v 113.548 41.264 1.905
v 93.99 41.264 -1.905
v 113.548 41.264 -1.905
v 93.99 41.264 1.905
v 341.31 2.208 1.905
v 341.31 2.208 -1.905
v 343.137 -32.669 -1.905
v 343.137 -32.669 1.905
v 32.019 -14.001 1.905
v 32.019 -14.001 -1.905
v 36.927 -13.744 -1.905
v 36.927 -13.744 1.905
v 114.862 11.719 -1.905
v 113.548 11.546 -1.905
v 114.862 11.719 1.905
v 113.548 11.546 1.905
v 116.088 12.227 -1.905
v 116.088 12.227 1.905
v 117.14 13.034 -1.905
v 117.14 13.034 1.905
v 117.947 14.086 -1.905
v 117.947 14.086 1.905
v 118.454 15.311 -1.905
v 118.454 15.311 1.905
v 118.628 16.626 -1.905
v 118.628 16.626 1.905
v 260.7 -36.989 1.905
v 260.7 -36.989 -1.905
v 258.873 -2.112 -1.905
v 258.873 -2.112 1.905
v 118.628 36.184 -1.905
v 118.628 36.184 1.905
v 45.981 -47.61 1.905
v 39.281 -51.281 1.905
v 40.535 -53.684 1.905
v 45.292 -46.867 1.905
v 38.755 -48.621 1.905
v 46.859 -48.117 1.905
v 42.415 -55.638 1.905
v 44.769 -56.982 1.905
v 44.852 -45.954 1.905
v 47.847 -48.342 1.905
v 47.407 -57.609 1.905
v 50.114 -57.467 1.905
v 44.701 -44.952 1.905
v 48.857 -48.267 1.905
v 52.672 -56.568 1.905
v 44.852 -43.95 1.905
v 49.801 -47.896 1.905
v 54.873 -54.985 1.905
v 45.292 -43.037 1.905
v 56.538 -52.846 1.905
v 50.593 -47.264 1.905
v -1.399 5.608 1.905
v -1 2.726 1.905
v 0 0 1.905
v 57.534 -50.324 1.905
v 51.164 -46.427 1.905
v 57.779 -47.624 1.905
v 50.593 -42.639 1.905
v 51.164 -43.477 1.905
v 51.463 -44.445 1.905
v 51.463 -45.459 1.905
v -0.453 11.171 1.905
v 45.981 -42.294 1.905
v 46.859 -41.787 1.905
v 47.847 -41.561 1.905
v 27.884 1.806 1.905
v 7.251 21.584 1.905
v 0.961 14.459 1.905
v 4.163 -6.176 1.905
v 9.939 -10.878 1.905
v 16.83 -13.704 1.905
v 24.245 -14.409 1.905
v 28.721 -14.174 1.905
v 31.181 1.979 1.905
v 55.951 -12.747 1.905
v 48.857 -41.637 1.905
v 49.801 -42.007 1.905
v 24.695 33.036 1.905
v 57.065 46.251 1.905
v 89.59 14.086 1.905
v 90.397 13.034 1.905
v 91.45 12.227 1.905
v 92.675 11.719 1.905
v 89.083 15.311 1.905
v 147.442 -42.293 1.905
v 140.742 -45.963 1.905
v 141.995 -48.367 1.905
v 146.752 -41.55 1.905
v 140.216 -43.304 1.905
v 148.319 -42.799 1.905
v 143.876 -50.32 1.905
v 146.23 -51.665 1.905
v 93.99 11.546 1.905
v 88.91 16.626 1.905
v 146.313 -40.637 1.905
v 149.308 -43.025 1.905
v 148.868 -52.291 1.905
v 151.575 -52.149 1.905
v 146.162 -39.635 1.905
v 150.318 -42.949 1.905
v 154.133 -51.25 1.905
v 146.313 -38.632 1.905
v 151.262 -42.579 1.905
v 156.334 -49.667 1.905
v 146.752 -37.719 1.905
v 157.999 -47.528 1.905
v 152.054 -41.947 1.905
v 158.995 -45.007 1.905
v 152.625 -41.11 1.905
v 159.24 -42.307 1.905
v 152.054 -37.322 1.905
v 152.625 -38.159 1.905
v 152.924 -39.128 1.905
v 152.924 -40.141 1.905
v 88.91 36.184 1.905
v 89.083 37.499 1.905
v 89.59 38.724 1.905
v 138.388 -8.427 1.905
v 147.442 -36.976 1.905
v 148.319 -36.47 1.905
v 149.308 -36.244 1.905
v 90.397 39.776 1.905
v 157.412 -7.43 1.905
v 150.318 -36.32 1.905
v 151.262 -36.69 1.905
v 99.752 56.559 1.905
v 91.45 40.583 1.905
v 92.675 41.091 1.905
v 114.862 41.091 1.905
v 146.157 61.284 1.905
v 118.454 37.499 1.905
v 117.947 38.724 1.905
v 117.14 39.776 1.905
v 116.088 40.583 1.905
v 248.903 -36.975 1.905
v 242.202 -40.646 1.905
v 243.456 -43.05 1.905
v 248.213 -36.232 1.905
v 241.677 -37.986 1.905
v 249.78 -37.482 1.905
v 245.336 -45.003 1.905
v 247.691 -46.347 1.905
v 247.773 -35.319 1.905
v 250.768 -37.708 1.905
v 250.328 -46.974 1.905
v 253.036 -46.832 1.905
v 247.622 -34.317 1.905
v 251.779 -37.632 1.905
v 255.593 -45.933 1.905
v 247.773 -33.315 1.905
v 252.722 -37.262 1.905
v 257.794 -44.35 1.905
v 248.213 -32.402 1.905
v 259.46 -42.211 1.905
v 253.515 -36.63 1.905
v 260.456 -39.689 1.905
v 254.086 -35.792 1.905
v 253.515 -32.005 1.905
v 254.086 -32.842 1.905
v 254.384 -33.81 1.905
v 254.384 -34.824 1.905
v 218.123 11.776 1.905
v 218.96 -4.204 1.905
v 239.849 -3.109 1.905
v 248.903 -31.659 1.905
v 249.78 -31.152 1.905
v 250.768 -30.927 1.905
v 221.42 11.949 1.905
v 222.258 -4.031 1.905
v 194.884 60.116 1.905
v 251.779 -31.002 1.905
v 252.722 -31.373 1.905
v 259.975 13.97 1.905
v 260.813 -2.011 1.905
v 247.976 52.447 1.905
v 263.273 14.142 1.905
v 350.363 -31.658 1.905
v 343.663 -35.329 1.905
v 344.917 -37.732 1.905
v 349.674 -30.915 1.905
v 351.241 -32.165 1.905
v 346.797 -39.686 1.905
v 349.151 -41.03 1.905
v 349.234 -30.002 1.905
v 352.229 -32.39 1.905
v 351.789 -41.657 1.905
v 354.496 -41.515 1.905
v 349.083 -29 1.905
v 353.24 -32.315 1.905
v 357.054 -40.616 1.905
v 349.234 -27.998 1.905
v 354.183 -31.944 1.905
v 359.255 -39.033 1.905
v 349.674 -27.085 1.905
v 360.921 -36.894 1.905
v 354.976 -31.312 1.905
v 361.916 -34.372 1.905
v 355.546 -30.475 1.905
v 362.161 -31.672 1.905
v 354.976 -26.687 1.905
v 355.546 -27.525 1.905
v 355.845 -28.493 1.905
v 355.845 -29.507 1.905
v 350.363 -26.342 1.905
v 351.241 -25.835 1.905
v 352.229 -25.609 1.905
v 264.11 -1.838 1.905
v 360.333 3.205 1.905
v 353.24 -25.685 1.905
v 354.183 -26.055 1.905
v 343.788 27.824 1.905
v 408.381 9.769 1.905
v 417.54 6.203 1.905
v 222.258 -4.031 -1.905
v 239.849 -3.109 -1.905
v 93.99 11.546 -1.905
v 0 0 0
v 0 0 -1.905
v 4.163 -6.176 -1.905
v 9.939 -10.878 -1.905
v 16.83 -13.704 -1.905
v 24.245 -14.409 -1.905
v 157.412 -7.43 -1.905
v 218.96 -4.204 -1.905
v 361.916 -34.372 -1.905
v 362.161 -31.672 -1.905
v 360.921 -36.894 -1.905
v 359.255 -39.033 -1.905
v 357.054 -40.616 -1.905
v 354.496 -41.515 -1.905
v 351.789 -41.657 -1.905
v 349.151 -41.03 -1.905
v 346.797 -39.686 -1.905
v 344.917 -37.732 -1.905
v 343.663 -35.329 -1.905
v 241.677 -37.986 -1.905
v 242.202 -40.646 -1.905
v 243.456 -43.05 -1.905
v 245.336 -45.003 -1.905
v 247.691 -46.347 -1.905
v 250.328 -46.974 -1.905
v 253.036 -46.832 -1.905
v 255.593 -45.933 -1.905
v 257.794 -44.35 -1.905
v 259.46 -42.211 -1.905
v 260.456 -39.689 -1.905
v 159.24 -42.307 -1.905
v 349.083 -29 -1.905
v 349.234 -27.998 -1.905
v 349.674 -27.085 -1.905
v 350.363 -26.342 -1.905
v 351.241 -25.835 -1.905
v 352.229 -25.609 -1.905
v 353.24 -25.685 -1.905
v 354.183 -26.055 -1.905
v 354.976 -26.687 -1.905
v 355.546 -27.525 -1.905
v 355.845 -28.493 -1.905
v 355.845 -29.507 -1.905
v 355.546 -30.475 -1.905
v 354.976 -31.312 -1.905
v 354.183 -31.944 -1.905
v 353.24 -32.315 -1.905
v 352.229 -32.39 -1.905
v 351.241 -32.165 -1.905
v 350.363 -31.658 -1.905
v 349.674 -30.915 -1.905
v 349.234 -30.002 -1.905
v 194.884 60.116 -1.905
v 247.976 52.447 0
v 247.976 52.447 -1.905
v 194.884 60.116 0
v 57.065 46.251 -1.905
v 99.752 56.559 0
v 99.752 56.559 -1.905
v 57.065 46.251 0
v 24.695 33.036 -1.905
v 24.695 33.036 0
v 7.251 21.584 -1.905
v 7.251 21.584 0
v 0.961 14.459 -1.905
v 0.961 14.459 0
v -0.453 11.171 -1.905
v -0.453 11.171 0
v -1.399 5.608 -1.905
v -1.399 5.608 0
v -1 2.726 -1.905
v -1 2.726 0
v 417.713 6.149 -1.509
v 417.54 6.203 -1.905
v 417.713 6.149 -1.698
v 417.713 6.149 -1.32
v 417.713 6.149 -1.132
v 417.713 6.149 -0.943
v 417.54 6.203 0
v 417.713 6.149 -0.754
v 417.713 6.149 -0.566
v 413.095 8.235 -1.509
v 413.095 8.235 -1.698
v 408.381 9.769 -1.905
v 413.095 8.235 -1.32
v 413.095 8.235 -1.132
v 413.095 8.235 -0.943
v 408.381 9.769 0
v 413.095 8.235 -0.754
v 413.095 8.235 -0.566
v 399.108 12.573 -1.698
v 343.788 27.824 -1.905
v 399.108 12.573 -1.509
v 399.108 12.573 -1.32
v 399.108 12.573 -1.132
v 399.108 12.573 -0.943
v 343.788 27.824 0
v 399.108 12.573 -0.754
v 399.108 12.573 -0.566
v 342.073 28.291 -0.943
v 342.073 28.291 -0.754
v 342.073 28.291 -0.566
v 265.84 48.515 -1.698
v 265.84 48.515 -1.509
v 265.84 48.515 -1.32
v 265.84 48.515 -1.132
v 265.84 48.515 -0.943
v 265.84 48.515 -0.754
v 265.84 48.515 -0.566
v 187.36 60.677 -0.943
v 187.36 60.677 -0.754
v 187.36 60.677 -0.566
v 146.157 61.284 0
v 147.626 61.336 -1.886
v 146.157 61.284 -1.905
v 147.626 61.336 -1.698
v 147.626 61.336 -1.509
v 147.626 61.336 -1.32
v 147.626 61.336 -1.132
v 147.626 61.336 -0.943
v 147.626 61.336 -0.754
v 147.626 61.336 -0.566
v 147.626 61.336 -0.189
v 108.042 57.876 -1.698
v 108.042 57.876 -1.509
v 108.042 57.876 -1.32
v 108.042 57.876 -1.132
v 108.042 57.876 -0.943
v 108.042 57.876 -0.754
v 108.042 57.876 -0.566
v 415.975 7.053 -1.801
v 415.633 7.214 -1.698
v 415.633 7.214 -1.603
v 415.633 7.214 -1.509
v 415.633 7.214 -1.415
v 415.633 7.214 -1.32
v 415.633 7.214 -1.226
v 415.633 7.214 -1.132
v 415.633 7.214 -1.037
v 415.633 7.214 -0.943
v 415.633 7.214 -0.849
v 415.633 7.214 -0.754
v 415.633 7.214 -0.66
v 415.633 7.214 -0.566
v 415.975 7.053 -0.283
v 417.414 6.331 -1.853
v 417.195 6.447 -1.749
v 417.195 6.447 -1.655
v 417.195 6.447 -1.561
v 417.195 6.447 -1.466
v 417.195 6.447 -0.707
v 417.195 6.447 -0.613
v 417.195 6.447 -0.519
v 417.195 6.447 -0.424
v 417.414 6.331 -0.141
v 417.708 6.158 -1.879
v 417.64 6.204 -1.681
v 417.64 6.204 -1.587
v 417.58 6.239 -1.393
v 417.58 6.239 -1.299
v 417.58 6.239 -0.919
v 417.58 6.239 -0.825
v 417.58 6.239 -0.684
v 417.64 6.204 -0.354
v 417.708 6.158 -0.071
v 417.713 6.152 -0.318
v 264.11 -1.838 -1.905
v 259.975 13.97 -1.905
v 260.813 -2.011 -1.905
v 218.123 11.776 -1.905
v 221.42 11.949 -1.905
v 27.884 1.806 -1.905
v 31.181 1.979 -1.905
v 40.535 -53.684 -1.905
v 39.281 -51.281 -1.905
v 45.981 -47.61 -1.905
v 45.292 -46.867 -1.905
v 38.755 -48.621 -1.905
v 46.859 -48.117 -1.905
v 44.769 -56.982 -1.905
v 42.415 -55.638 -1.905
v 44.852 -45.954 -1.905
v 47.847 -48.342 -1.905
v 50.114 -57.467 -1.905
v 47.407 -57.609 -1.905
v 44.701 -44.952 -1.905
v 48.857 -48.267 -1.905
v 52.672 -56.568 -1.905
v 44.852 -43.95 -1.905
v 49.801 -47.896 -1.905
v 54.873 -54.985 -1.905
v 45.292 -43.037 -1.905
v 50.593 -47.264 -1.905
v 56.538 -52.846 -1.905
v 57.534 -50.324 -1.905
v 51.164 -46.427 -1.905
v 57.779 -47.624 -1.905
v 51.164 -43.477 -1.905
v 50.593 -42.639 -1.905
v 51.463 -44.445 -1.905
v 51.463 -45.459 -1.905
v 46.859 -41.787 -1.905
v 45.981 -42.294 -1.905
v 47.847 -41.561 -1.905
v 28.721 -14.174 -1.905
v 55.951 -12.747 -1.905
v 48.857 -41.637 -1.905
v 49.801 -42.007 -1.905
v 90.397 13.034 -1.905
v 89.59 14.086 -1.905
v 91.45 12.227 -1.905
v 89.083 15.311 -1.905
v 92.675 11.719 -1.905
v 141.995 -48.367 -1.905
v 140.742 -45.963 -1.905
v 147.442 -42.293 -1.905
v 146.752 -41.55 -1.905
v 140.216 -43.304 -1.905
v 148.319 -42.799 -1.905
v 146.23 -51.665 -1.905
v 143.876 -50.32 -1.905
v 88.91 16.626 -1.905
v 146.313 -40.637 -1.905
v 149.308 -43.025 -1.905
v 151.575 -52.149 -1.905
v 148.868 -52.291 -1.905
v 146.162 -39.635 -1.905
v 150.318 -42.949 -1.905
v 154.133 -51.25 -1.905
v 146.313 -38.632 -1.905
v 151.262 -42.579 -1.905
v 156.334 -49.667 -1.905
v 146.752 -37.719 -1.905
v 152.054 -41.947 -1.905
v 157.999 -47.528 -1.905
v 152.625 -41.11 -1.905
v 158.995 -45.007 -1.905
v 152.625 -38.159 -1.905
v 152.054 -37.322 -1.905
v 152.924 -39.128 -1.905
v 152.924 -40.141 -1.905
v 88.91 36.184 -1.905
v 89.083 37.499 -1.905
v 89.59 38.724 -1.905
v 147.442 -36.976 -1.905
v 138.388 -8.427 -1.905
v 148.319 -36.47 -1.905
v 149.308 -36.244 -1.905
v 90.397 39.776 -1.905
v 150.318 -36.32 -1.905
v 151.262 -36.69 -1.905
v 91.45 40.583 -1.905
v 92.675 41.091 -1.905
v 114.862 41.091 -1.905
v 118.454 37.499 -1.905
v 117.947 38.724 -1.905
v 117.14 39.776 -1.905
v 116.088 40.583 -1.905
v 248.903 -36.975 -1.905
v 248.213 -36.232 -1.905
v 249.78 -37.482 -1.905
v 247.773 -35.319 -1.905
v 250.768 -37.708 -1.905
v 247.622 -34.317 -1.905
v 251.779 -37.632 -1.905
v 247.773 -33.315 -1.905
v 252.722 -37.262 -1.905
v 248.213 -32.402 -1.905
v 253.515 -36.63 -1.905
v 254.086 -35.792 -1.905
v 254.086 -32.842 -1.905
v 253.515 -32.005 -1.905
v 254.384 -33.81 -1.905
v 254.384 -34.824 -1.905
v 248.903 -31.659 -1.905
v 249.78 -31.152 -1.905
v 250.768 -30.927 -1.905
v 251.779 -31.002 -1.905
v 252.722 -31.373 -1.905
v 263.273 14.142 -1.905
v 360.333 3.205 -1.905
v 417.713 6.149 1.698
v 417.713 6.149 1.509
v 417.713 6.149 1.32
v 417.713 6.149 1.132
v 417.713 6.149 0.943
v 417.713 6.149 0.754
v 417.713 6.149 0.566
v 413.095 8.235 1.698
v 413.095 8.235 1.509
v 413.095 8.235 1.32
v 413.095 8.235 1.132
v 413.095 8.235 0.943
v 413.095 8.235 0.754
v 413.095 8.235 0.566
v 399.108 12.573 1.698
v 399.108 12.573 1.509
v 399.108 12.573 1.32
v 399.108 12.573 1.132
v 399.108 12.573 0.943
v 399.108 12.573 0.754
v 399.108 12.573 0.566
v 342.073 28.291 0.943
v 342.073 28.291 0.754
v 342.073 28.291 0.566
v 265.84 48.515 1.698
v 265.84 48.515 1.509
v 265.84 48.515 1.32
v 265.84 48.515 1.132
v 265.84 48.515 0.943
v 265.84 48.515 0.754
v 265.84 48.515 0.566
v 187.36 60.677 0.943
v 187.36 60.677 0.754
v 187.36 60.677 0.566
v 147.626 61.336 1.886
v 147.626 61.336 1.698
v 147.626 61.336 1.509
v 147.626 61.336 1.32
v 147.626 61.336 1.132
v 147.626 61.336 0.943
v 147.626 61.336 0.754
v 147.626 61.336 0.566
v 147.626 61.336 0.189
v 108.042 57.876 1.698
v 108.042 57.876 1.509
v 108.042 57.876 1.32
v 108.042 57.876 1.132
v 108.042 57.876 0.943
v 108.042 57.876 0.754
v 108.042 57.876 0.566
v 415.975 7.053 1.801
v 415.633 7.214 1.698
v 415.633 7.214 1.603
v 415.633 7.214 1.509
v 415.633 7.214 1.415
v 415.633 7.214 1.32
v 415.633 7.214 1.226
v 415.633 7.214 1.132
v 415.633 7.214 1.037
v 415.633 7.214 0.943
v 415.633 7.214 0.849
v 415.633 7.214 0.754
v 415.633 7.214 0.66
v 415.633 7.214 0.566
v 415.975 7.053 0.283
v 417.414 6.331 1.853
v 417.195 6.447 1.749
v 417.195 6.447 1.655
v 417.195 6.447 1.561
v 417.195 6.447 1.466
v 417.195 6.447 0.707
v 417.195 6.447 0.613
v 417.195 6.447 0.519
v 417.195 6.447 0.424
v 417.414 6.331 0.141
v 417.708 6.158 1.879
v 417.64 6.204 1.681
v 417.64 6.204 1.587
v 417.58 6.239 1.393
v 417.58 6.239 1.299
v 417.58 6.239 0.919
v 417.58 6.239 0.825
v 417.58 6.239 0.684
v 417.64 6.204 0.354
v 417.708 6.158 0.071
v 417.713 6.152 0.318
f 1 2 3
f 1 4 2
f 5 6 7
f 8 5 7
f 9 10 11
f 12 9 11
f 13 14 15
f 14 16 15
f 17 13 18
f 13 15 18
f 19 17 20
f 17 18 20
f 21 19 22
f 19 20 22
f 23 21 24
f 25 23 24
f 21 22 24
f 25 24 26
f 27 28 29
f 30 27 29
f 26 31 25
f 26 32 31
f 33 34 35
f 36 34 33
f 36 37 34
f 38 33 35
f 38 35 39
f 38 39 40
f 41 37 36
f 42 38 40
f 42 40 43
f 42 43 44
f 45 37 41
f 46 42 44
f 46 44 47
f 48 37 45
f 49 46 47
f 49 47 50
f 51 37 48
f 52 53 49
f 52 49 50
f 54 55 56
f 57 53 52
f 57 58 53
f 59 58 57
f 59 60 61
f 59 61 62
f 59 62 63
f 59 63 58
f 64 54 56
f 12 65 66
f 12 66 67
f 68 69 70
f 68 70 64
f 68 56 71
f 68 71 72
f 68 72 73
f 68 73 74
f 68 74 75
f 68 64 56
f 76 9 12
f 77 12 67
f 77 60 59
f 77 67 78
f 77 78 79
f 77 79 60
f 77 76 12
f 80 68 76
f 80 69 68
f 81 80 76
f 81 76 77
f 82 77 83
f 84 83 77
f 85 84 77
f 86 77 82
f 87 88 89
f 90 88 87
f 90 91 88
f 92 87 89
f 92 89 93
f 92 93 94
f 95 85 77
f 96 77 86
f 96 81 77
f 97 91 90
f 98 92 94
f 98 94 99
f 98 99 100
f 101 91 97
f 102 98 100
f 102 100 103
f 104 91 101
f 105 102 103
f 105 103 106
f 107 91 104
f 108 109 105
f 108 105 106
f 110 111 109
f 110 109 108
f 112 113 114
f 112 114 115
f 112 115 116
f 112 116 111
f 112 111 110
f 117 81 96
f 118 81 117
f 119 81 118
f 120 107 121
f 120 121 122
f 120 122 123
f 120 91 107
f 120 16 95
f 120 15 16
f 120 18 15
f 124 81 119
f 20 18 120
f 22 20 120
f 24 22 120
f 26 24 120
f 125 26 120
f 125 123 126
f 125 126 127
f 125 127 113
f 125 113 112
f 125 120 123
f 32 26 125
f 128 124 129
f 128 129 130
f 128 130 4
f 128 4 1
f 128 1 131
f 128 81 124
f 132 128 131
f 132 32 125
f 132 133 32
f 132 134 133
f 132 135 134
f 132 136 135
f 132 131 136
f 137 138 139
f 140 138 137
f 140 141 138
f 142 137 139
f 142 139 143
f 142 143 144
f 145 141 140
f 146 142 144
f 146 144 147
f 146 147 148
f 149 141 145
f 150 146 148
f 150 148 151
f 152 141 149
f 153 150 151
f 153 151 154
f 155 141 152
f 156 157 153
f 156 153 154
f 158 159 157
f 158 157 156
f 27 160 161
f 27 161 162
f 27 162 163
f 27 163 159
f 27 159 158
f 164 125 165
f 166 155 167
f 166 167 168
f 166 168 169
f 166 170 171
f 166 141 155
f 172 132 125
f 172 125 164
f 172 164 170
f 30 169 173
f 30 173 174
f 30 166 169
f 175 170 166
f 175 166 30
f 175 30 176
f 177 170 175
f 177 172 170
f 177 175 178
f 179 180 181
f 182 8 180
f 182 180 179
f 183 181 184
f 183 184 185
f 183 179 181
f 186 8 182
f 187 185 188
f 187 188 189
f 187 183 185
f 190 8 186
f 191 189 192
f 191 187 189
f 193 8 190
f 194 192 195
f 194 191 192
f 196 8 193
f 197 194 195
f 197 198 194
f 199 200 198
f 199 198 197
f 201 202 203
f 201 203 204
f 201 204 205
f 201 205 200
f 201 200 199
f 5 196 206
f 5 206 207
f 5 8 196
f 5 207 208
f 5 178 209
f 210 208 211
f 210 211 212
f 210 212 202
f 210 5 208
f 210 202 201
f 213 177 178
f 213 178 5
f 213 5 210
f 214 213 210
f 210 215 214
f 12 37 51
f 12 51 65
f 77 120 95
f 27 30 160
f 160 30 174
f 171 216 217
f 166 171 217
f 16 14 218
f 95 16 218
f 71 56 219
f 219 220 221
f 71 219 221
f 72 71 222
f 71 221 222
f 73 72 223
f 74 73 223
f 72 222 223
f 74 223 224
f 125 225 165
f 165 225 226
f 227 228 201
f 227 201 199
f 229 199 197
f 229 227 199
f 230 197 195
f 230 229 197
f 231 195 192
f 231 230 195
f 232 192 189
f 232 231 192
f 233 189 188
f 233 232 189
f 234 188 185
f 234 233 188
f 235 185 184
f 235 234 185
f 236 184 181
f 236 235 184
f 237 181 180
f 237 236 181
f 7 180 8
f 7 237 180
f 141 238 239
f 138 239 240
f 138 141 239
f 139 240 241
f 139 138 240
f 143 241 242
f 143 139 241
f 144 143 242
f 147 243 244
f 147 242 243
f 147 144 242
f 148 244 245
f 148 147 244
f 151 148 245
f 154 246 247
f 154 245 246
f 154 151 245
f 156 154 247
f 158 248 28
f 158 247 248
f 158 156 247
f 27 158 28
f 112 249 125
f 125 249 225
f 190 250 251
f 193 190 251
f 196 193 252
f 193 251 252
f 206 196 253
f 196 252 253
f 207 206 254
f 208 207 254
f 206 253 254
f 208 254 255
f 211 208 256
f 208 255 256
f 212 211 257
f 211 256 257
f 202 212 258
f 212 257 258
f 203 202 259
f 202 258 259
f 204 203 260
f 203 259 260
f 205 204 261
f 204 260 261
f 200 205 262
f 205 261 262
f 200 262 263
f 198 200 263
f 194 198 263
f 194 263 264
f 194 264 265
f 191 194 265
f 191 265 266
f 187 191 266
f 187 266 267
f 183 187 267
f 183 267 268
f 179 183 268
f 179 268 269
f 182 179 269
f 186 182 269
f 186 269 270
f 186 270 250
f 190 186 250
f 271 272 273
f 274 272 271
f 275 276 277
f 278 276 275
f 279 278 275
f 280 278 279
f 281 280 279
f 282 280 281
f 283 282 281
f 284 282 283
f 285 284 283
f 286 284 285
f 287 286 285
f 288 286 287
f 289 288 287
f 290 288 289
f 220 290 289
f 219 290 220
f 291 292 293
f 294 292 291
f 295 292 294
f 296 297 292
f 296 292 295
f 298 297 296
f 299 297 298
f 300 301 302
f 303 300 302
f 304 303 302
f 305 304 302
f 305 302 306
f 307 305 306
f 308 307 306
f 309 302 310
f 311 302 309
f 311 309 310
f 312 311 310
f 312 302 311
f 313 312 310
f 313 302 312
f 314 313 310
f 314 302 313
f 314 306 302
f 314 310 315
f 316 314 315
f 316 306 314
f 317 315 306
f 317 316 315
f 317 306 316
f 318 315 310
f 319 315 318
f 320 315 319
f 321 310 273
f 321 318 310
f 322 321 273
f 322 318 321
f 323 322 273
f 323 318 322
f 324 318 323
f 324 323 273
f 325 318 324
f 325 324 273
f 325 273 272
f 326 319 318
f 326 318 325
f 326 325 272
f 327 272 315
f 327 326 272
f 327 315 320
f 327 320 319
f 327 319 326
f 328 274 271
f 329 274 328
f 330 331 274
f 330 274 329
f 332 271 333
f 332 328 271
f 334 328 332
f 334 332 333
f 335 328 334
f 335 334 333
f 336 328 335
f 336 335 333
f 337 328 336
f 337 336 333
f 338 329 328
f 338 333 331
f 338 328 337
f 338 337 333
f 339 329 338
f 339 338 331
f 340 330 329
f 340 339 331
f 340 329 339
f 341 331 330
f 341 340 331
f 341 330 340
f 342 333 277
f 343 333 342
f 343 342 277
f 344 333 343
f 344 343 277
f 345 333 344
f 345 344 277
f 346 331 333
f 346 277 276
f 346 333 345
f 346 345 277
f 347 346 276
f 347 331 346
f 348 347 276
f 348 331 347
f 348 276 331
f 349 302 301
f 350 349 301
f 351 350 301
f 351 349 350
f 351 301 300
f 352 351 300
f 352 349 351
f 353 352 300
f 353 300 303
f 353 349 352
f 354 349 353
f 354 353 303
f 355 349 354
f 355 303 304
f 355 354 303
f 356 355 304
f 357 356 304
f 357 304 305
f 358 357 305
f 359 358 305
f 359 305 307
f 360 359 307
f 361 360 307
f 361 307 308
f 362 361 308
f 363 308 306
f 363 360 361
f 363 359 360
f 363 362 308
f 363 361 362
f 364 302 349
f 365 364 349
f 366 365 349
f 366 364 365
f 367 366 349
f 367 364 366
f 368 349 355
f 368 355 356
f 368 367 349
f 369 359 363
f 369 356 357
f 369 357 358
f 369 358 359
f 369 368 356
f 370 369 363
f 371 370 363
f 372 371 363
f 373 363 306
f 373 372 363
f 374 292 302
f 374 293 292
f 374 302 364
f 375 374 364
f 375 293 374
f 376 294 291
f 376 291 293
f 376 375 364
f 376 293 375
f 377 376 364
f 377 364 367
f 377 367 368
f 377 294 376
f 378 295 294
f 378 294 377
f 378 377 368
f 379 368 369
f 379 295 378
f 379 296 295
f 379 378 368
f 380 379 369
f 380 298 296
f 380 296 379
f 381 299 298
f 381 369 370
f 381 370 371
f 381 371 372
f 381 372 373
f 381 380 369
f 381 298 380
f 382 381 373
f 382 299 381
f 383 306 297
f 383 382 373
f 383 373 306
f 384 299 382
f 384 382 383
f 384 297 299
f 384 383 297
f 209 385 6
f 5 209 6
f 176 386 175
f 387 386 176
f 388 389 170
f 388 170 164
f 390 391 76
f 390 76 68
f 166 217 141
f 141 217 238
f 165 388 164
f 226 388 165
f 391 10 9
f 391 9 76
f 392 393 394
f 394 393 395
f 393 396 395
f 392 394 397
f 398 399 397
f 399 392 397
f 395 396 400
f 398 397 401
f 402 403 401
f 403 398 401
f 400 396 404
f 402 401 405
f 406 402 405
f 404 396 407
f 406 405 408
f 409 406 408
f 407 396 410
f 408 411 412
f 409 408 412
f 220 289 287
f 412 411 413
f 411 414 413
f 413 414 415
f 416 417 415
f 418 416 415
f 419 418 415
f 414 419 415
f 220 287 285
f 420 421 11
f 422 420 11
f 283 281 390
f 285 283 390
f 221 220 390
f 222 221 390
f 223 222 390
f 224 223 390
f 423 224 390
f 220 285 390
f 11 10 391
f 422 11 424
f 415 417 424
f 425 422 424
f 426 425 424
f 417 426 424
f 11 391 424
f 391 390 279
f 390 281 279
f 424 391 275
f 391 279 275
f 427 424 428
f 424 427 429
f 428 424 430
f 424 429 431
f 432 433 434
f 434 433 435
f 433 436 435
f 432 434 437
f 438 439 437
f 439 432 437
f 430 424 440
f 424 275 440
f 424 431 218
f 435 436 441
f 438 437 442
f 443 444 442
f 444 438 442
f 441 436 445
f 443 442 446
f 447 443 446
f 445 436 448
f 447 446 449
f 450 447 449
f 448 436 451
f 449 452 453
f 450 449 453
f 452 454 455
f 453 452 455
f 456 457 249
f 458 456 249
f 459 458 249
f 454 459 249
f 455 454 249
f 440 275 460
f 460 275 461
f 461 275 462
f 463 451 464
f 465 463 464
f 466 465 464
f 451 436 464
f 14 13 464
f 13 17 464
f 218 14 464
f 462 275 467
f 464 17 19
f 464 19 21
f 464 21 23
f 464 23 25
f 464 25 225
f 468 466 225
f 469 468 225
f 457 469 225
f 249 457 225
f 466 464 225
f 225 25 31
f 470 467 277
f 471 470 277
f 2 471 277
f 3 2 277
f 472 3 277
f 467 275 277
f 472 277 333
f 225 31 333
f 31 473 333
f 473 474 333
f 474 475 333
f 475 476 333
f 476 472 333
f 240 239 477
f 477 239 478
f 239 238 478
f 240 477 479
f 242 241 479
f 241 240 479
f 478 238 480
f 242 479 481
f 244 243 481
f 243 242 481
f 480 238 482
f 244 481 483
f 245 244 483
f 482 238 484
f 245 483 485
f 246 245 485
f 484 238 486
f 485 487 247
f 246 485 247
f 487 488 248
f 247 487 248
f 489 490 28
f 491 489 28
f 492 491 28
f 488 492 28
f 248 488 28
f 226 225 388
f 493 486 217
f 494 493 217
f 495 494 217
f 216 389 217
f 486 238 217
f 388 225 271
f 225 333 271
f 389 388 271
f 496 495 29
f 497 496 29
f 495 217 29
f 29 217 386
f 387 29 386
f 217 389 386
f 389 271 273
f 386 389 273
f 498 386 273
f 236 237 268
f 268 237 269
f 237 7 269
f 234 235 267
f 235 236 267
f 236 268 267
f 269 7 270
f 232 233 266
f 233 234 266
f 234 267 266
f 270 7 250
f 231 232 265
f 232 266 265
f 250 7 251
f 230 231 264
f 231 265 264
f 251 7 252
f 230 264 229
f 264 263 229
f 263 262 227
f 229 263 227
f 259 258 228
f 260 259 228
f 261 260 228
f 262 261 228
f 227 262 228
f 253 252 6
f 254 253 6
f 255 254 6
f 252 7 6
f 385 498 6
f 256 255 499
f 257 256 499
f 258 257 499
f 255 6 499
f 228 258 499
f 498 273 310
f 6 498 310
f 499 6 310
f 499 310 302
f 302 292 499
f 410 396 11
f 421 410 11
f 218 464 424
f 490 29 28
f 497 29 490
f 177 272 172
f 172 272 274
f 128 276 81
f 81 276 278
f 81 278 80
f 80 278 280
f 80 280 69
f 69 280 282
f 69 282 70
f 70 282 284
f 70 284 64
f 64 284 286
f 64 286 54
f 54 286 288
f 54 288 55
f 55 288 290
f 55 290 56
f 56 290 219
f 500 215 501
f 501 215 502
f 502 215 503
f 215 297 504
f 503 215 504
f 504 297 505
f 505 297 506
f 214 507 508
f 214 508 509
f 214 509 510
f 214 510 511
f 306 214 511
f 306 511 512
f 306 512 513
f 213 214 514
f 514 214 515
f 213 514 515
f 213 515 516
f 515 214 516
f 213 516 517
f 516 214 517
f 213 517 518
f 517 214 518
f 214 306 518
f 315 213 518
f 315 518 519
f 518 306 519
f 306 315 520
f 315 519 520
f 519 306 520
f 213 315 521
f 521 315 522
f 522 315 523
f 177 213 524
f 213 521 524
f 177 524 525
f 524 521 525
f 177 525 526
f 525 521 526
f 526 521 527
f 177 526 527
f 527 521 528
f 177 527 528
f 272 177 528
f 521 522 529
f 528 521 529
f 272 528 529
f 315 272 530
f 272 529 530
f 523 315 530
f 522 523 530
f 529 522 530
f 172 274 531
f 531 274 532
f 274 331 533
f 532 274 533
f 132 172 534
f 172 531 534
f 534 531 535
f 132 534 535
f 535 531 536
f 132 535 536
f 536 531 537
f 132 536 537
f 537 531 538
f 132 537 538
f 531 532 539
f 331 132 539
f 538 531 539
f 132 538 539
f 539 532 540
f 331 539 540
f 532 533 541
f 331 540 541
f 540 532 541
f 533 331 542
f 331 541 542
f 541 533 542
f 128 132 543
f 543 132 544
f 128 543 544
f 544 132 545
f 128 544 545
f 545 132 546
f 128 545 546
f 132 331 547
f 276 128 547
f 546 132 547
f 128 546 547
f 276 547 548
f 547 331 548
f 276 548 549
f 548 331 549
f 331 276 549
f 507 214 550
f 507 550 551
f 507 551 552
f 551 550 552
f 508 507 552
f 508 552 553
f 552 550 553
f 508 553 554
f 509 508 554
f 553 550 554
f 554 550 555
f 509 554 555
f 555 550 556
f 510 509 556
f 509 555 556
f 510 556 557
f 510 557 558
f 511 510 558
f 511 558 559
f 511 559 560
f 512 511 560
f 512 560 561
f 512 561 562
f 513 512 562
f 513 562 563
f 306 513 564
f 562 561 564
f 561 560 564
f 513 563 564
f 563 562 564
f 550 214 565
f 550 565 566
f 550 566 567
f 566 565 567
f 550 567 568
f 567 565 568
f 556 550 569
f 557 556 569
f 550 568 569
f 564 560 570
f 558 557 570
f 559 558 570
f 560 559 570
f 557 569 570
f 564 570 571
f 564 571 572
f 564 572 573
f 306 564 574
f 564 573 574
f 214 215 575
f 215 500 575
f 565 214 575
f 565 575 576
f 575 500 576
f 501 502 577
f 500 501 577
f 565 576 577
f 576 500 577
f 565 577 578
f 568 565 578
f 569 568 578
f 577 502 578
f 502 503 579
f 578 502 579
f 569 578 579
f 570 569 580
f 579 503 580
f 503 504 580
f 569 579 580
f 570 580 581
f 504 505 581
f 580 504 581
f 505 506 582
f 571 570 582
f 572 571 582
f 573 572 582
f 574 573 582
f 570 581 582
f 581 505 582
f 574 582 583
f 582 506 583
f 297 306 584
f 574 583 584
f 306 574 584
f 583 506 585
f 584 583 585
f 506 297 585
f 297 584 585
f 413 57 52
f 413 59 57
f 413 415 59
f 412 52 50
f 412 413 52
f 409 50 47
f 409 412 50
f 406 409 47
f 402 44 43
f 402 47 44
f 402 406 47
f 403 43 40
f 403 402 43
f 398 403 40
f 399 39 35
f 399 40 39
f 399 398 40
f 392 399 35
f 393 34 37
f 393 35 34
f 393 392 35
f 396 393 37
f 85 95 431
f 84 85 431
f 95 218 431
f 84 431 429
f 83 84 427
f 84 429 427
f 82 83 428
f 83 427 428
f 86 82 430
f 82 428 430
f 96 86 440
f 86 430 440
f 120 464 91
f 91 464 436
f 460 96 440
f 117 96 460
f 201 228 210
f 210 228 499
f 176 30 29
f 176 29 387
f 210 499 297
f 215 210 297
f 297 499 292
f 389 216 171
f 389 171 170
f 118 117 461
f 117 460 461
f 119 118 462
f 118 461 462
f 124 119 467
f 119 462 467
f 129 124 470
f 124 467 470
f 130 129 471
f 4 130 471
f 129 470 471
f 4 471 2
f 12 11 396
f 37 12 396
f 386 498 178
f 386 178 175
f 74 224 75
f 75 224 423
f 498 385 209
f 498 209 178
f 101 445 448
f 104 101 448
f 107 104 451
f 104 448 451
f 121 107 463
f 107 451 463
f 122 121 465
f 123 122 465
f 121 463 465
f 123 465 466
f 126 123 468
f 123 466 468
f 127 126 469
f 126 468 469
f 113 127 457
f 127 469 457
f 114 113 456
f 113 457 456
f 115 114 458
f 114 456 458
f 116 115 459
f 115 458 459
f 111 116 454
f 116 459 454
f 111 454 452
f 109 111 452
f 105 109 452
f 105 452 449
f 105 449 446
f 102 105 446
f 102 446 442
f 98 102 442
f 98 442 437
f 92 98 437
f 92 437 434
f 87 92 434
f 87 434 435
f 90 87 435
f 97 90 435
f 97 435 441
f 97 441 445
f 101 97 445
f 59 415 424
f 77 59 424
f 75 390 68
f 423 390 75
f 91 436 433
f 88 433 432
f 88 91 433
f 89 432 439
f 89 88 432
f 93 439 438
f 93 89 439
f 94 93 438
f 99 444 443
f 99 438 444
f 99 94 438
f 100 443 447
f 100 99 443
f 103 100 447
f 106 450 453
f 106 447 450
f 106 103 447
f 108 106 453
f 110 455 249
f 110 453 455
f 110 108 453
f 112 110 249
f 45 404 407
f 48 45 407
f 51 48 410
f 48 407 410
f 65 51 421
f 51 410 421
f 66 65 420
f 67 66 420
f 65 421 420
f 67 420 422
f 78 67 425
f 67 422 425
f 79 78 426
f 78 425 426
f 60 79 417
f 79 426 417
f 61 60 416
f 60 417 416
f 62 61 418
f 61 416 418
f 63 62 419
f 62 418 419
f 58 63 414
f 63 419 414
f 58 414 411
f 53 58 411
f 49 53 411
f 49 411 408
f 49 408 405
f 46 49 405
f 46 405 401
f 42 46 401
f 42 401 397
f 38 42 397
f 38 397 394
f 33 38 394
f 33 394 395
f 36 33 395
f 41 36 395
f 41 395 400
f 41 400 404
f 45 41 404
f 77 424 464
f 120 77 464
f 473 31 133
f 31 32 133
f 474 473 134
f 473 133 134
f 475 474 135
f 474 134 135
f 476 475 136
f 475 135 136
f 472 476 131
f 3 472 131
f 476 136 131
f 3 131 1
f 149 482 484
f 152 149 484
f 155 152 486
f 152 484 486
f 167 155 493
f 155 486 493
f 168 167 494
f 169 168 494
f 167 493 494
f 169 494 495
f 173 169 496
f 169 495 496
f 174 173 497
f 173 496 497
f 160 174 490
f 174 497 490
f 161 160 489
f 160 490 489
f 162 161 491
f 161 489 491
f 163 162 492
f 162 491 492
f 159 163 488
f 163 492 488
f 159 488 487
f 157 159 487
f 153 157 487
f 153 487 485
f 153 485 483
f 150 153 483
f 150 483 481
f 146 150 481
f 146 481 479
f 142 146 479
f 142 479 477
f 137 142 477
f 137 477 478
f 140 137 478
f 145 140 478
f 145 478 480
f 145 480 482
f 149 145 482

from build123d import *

# Parameters (mm, degrees)
BOSS_EXTRUDE1_DEPTH     = 1.905
BOSS_EXTRUDE2_START     = -1.905
BOSS_EXTRUDE2_DEPTH     = 3.81
TAP_DRILL_FOR_M8_TAP1_D = 6.8
FILLET1_R               = 5.08
CUT_EXTRUDE1_DEPTH      = 423.240896091
CUT_EXTRUDE1_DEPTH_BACK = 423.240896091
FILLET3_RADIUS          = 9.525
FILLET3_LENGTH          = 3.81
FILLET4_RADIUS          = 9.525
FILLET4_LENGTH          = 3.81
FILLET5_RADIUS          = 9.525
FILLET5_LENGTH          = 3.81
FILLET6_RADIUS          = 9.525
FILLET6_LENGTH          = 3.81


# Read off the part's stored shape, not the designer's step: Boss-Extrude2
with BuildPart() as part:
    # Sketch1 → Boss-Extrude1 (new, symmetric)
    with BuildSketch(Plane.XY):
        with BuildLine():
            Line((88.909580783, 41.26391721), (118.627580783, 41.26391721))
            Line((118.627580783, 41.26391721), (118.627580783, 11.54591721))
            Line((118.627580783, 11.54591721), (104.657580783, 11.54591721))
            Line((104.657580783, 11.54591721), (104.657580783, -6.092999308))
            add(Edge.make_bspline(
                [(104.657580783, -6.092999308), (105.78576696, -6.059407355), (110.631815253, -5.913506799), (119.301873398, -5.639779221), (130.760417354, -5.247131629), (142.497040297, -4.804534274), (154.470843852, -4.303823254), (166.639786874, -3.721010638), (178.960468691, -3.016797235), (191.389100737, -2.180004159), (203.882560612, -1.218144366), (216.39628583, -0.134616133), (228.885986304, 1.060875443), (241.307012185, 2.343253014), (253.616279039, 3.664244089), (265.772095128, 4.965053183), (277.731490713, 6.209836508), (289.45199663, 7.374456804), (300.891969345, 8.438297263), (312.011551274, 9.378204355), (322.771419978, 10.182138596), (333.133998236, 10.833574931), (343.062487119, 11.328143195), (352.522037602, 11.650436807), (361.47904928, 11.831540776), (369.902441551, 11.810346197), (377.762625202, 11.656292062), (385.030592513, 11.344437654), (391.68484956, 10.895614899), (397.689387538, 10.328444191), (403.063035719, 9.638969084), (407.663858949, 8.932969554), (411.84953295, 7.985992463), (414.53368223, 7.52009233), (419.143107129, 5.466978357), (414.520586066, 7.829160816), (411.856340794, 8.603478482), (407.655866836, 10.032984433), (403.060664813, 11.413668567), (397.685628885, 12.995705784), (391.682523818, 14.702815518), (385.029118067, 16.561547034), (377.76192652, 18.564224708), (369.902953821, 20.715322997), (361.480188002, 23.009061308), (352.523844819, 25.446080399), (343.06573052, 28.021990963), (333.136012333, 30.718866033), (322.7818834, 33.570585543), (311.975311356, 36.398897394), (300.975484828, 39.84355007), (289.42464591, 42.471486304), (277.760382476, 45.638812888), (265.799607232, 48.558228126), (253.647270041, 51.317410307), (241.333764909, 53.799191005), (228.908808416, 55.982875957), (216.414443808, 57.828987679), (203.896579889, 59.324649469), (191.398887145, 60.45608609), (178.965067687, 61.204134062), (166.639581281, 61.567998585), (154.466261788, 61.564684681), (142.487428182, 61.192168146), (130.745466135, 60.461851913), (119.27965342, 59.390109524), (108.135195394, 57.951193311), (97.349793586, 56.195302776), (86.959680907, 54.167962822), (77.001482933, 51.901273201), (67.510182352, 49.425050582), (58.519352194, 46.765961709), (50.060387838, 43.951821062), (42.162499305, 41.011003286), (34.853856572, 37.969908862), (28.15980047, 34.856885781), (22.102555486, 31.702210335), (16.703758276, 28.533121102), (11.978464499, 25.379509483), (7.942830392, 22.262794683), (4.5824322, 19.18797639), (1.957778069, 16.087560883), (-0.207226816, 12.684684668), (-0.907805064, 9.228884918), (-1.560514008, 5.882802979), (-1.147165708, 2.816033578), (-0.009188676, -0.274836968), (1.841756771, -3.001235322), (4.508620223, -5.171701763), (7.983340931, -6.442446365), (12.066016603, -7.059329176), (16.790523111, -7.394736703), (22.181697881, -7.563354981), (28.230842797, -7.674266105), (34.916798872, -7.484533075), (42.21994635, -7.600539498), (50.111658487, -7.421501694), (58.565799156, -7.276468805), (67.552092336, -7.074739405), (77.0391238, -6.84918955), (86.993460829, -6.592701098), (95.404954455, -6.362178203), (100.494330717, -6.215531943), (102.117580783, -6.167999853)],
                knots=[0.639208193, 0.639208193, 0.639208193, 0.639208193, 0.643094929, 0.655903573, 0.669079202, 0.6825766, 0.696348373, 0.710348009, 0.724529116, 0.738844327, 0.753243365, 0.767678182, 0.782097111, 0.79644888, 0.810678263, 0.824728613, 0.838547559, 0.852083943, 0.865287848, 0.878111787, 0.890511304, 0.902443005, 0.913865891, 0.924742046, 0.935035831, 0.944714495, 0.953747112, 0.962105881, 0.969765452, 0.97670305, 0.982898839, 0.988333206, 0.992993712, 0.996866343, 1, 1.003263265, 1.007250558, 1.012051787, 1.017662333, 1.024068314, 1.031249696, 1.03918465, 1.047847638, 1.057210696, 1.067242333, 1.07790876, 1.089173985, 1.100998599, 1.113341295, 1.126157183, 1.139462308, 1.15301104, 1.166927615, 1.181082, 1.19540448, 1.209838051, 1.224332605, 1.238841949, 1.253325073, 1.267739982, 1.282048685, 1.296212777, 1.310196043, 1.323962314, 1.337476235, 1.350702495, 1.363610632, 1.376163959, 1.388325705, 1.400058826, 1.41132739, 1.422098222, 1.43233946, 1.442020271, 1.451113163, 1.459592207, 1.467434959, 1.474622154, 1.48114013, 1.486983094, 1.492171114, 1.496782496, 1.500970226, 1.505871632, 1.508789423, 1.512670174, 1.516325668, 1.520069902, 1.523879651, 1.527960743, 1.532641784, 1.538069255, 1.544264221, 1.551214848, 1.558899645, 1.567291448, 1.576362099, 1.586079537, 1.596409112, 1.607314709, 1.618758332, 1.630699138, 1.636291347, 1.636291347, 1.636291347, 1.636291347], degree=3))
            Line((102.117580783, -6.167999853), (102.117580783, 11.54591721))
            Line((102.117580783, 11.54591721), (88.909580783, 11.54591721))
            Line((88.909580783, 11.54591721), (88.909580783, 41.26391721))
        make_face()
    extrude(amount=BOSS_EXTRUDE1_DEPTH, both=True)

    # Boss-Extrude2 outline → Boss-Extrude2 (add)
    with BuildSketch(Plane.XY.offset(BOSS_EXTRUDE2_START)):
        with BuildLine():
            Line((104.657580783, 11.54591721), (102.117580783, 11.54591721))
            Line((102.117580783, 11.54591721), (102.117580783, -6.167999853))
            add(Edge.make_bspline(
                [(0, 0), (0.032082235, -0.06523567), (0.553122873, -1.103108425), (1.841756771, -3.001235322), (4.508620223, -5.171701763), (7.983340931, -6.442446365), (12.066016603, -7.059329176), (16.790523111, -7.394736703), (22.181697881, -7.563354981), (28.230842797, -7.674266105), (34.916798872, -7.484533075), (42.21994635, -7.600539498), (50.111658487, -7.421501694), (58.565799156, -7.276468805), (67.552092336, -7.074739405), (77.0391238, -6.84918955), (86.993460829, -6.592701098), (95.404954455, -6.362178203), (100.494330717, -6.215531943), (102.117580783, -6.167999853)],
                knots=[1.516075579, 1.516075579, 1.516075579, 1.516075579, 1.516325668, 1.520069902, 1.523879651, 1.527960743, 1.532641784, 1.538069255, 1.544264221, 1.551214848, 1.558899645, 1.567291448, 1.576362099, 1.586079537, 1.596409112, 1.607314709, 1.618758332, 1.630699138, 1.636291347, 1.636291347, 1.636291347, 1.636291347], degree=3))
            ThreePointArc((0, 0), (9.93879362, -10.878398923), (24.244645014, -14.408526068))
            Line((24.244645014, -14.408526068), (36.927240105, -13.743859424))
            Line((36.927240105, -13.743859424), (39.25357336, -58.132942244))
            Line((39.25357336, -58.132942244), (58.277465998, -57.135942277))
            Line((58.277465998, -57.135942277), (55.951132743, -12.746859457))
            Line((55.951132743, -12.746859457), (138.388000837, -8.42652627))
            Line((138.388000837, -8.42652627), (140.714334092, -52.815609089))
            Line((140.714334092, -52.815609089), (159.738226729, -51.818609123))
            Line((159.738226729, -51.818609123), (157.411893474, -7.429526303))
            Line((157.411893474, -7.429526303), (239.848761568, -3.109193115))
            Line((239.848761568, -3.109193115), (242.175094823, -47.498275935))
            Line((242.175094823, -47.498275935), (261.19898746, -46.501275969))
            Line((261.19898746, -46.501275969), (258.872654205, -2.112193149))
            Line((258.872654205, -2.112193149), (341.309522299, 2.208140039))
            Line((341.309522299, 2.208140039), (343.635855554, -42.180942781))
            Line((343.635855554, -42.180942781), (362.659748191, -41.183942814))
            Line((362.659748191, -41.183942814), (360.333414936, 3.205140005))
            Line((360.333414936, 3.205140005), (417.54003932, 6.203212141))
            add(Edge.make_bspline(
                [(104.657580783, -6.092999308), (105.78576696, -6.059407355), (110.631815253, -5.913506799), (119.301873398, -5.639779221), (130.760417354, -5.247131629), (142.497040297, -4.804534274), (154.470843852, -4.303823254), (166.639786874, -3.721010638), (178.960468691, -3.016797235), (191.389100737, -2.180004159), (203.882560612, -1.218144366), (216.39628583, -0.134616133), (228.885986304, 1.060875443), (241.307012185, 2.343253014), (253.616279039, 3.664244089), (265.772095128, 4.965053183), (277.731490713, 6.209836508), (289.45199663, 7.374456804), (300.891969345, 8.438297263), (312.011551274, 9.378204355), (322.771419978, 10.182138596), (333.133998236, 10.833574931), (343.062487119, 11.328143195), (352.522037602, 11.650436807), (361.47904928, 11.831540776), (369.902441551, 11.810346197), (377.762625202, 11.656292062), (385.030592513, 11.344437654), (391.68484956, 10.895614899), (397.689387538, 10.328444191), (403.063035719, 9.638969084), (407.663858949, 8.932969554), (411.84953295, 7.985992463), (414.389124606, 7.545183862), (417.126697281, 6.361596446), (417.54003932, 6.203212141)],
                knots=[0.639208193, 0.639208193, 0.639208193, 0.639208193, 0.643094929, 0.655903573, 0.669079202, 0.6825766, 0.696348373, 0.710348009, 0.724529116, 0.738844327, 0.753243365, 0.767678182, 0.782097111, 0.79644888, 0.810678263, 0.824728613, 0.838547559, 0.852083943, 0.865287848, 0.878111787, 0.890511304, 0.902443005, 0.913865891, 0.924742046, 0.935035831, 0.944714495, 0.953747112, 0.962105881, 0.969765452, 0.97670305, 0.982898839, 0.988333206, 0.992993712, 0.996866343, 0.999371673, 0.999371673, 0.999371673, 0.999371673], degree=3))
            Line((104.657580783, -6.092999308), (104.657580783, 11.54591721))
        make_face()
    extrude(amount=BOSS_EXTRUDE2_DEPTH)

    # Tap Drill for M8 Tap1 (through all)
    with Locations(Plane.XY.offset(1.905)):
        with Locations((48.100853035, -44.951847169), (149.561613766, -39.634514015), (251.022374497, -34.31718086), (352.483135228, -28.999847706)):
            Hole(TAP_DRILL_FOR_M8_TAP1_D / 2)

    # Fillet1
    fillet1_edges = [part.edges().sort_by_distance(p)[0] for p in [
        (88.909580783, 11.54591721, 0),
        (118.627580783, 11.54591721, 0),
        (118.627580783, 41.26391721, 0),
        (88.909580783, 41.26391721, 0),
    ]]
    fillet(fillet1_edges, radius=FILLET1_R)

    # Sketch8 → Cut-Extrude1 (cut, two sides: drawn at the far end of the back side and taken through both)
    with BuildSketch(Plane.XY.offset(1.905).offset(-CUT_EXTRUDE1_DEPTH_BACK)):
        Polygon((32.01864182, -14.001108159), (31.181161848, 1.978961656), (27.883687124, 1.806148328), (28.721167096, -14.173921487), align=None)
        Polygon((222.257568191, -4.031108495), (221.420088219, 11.94896132), (218.122613495, 11.776147993), (218.960093467, -4.203921823), align=None)
        Polygon((264.110131992, -1.837708569), (263.27265202, 14.142361246), (259.975177297, 13.969547919), (260.812657268, -2.010521896), align=None)
    extrude(amount=CUT_EXTRUDE1_DEPTH + CUT_EXTRUDE1_DEPTH_BACK, mode=Mode.SUBTRACT)

    # Fillet3: full round fillet: the end face becomes a half cylinder, R = half its width
    fillet3_face = Plane((48.765519679, -57.634442261, 0), x_dir=(0, 0, -1), z_dir=(0.05233595627, -0.998629534753, 0))  # on the end face: x along it, z out of the body
    fillet3_slab = fillet3_face.offset(-FILLET3_RADIUS / 2) * Box(FILLET3_LENGTH, 2 * FILLET3_RADIUS, FILLET3_RADIUS, mode=Mode.PRIVATE)  # the body's end, R deep
    fillet3_round = Plane((48.267019696, -48.122495942, 0), x_dir=(0.05233595627, -0.998629534753, 0), z_dir=(0, 0, -1)) * Cylinder(FILLET3_RADIUS, FILLET3_LENGTH, mode=Mode.PRIVATE)  # its axis R under the face
    add(fillet3_slab - fillet3_round, mode=Mode.SUBTRACT)

    # Fillet4: full round fillet: the end face becomes a half cylinder, R = half its width
    fillet4_face = Plane((150.226280411, -52.317109106, 0), x_dir=(0, 0, 1), z_dir=(0.052335956221, -0.998629534756, 0))  # on the end face: x along it, z out of the body
    fillet4_slab = fillet4_face.offset(-FILLET4_RADIUS / 2) * Box(FILLET4_LENGTH, 2 * FILLET4_RADIUS, FILLET4_RADIUS, mode=Mode.PRIVATE)  # the body's end, R deep
    fillet4_round = Plane((149.727780428, -42.805162787, 0), x_dir=(0.052335956221, -0.998629534756, 0), z_dir=(0, 0, 1)) * Cylinder(FILLET4_RADIUS, FILLET4_LENGTH, mode=Mode.PRIVATE)  # its axis R under the face
    add(fillet4_slab - fillet4_round, mode=Mode.SUBTRACT)

    # Fillet5: full round fillet: the end face becomes a half cylinder, R = half its width
    fillet5_face = Plane((251.687041142, -46.999775952, 0), x_dir=(0, 0, 1), z_dir=(0.052335956221, -0.998629534756, 0))  # on the end face: x along it, z out of the body
    fillet5_slab = fillet5_face.offset(-FILLET5_RADIUS / 2) * Box(FILLET5_LENGTH, 2 * FILLET5_RADIUS, FILLET5_RADIUS, mode=Mode.PRIVATE)  # the body's end, R deep
    fillet5_round = Plane((251.188541159, -37.487829633, 0), x_dir=(0.052335956221, -0.998629534756, 0), z_dir=(0, 0, 1)) * Cylinder(FILLET5_RADIUS, FILLET5_LENGTH, mode=Mode.PRIVATE)  # its axis R under the face
    add(fillet5_slab - fillet5_round, mode=Mode.SUBTRACT)

    # Fillet6: full round fillet: the end face becomes a half cylinder, R = half its width
    fillet6_face = Plane((353.147801872, -41.682442798, 0), x_dir=(0, 0, -1), z_dir=(0.052335956273, -0.998629534753, 0))  # on the end face: x along it, z out of the body
    fillet6_slab = fillet6_face.offset(-FILLET6_RADIUS / 2) * Box(FILLET6_LENGTH, 2 * FILLET6_RADIUS, FILLET6_RADIUS, mode=Mode.PRIVATE)  # the body's end, R deep
    fillet6_round = Plane((352.649301888, -32.170496479, 0), x_dir=(0.052335956273, -0.998629534753, 0), z_dir=(0, 0, -1)) * Cylinder(FILLET6_RADIUS, FILLET6_LENGTH, mode=Mode.PRIVATE)  # its axis R under the face
    add(fillet6_slab - fillet6_round, mode=Mode.SUBTRACT)


solid = part.part
